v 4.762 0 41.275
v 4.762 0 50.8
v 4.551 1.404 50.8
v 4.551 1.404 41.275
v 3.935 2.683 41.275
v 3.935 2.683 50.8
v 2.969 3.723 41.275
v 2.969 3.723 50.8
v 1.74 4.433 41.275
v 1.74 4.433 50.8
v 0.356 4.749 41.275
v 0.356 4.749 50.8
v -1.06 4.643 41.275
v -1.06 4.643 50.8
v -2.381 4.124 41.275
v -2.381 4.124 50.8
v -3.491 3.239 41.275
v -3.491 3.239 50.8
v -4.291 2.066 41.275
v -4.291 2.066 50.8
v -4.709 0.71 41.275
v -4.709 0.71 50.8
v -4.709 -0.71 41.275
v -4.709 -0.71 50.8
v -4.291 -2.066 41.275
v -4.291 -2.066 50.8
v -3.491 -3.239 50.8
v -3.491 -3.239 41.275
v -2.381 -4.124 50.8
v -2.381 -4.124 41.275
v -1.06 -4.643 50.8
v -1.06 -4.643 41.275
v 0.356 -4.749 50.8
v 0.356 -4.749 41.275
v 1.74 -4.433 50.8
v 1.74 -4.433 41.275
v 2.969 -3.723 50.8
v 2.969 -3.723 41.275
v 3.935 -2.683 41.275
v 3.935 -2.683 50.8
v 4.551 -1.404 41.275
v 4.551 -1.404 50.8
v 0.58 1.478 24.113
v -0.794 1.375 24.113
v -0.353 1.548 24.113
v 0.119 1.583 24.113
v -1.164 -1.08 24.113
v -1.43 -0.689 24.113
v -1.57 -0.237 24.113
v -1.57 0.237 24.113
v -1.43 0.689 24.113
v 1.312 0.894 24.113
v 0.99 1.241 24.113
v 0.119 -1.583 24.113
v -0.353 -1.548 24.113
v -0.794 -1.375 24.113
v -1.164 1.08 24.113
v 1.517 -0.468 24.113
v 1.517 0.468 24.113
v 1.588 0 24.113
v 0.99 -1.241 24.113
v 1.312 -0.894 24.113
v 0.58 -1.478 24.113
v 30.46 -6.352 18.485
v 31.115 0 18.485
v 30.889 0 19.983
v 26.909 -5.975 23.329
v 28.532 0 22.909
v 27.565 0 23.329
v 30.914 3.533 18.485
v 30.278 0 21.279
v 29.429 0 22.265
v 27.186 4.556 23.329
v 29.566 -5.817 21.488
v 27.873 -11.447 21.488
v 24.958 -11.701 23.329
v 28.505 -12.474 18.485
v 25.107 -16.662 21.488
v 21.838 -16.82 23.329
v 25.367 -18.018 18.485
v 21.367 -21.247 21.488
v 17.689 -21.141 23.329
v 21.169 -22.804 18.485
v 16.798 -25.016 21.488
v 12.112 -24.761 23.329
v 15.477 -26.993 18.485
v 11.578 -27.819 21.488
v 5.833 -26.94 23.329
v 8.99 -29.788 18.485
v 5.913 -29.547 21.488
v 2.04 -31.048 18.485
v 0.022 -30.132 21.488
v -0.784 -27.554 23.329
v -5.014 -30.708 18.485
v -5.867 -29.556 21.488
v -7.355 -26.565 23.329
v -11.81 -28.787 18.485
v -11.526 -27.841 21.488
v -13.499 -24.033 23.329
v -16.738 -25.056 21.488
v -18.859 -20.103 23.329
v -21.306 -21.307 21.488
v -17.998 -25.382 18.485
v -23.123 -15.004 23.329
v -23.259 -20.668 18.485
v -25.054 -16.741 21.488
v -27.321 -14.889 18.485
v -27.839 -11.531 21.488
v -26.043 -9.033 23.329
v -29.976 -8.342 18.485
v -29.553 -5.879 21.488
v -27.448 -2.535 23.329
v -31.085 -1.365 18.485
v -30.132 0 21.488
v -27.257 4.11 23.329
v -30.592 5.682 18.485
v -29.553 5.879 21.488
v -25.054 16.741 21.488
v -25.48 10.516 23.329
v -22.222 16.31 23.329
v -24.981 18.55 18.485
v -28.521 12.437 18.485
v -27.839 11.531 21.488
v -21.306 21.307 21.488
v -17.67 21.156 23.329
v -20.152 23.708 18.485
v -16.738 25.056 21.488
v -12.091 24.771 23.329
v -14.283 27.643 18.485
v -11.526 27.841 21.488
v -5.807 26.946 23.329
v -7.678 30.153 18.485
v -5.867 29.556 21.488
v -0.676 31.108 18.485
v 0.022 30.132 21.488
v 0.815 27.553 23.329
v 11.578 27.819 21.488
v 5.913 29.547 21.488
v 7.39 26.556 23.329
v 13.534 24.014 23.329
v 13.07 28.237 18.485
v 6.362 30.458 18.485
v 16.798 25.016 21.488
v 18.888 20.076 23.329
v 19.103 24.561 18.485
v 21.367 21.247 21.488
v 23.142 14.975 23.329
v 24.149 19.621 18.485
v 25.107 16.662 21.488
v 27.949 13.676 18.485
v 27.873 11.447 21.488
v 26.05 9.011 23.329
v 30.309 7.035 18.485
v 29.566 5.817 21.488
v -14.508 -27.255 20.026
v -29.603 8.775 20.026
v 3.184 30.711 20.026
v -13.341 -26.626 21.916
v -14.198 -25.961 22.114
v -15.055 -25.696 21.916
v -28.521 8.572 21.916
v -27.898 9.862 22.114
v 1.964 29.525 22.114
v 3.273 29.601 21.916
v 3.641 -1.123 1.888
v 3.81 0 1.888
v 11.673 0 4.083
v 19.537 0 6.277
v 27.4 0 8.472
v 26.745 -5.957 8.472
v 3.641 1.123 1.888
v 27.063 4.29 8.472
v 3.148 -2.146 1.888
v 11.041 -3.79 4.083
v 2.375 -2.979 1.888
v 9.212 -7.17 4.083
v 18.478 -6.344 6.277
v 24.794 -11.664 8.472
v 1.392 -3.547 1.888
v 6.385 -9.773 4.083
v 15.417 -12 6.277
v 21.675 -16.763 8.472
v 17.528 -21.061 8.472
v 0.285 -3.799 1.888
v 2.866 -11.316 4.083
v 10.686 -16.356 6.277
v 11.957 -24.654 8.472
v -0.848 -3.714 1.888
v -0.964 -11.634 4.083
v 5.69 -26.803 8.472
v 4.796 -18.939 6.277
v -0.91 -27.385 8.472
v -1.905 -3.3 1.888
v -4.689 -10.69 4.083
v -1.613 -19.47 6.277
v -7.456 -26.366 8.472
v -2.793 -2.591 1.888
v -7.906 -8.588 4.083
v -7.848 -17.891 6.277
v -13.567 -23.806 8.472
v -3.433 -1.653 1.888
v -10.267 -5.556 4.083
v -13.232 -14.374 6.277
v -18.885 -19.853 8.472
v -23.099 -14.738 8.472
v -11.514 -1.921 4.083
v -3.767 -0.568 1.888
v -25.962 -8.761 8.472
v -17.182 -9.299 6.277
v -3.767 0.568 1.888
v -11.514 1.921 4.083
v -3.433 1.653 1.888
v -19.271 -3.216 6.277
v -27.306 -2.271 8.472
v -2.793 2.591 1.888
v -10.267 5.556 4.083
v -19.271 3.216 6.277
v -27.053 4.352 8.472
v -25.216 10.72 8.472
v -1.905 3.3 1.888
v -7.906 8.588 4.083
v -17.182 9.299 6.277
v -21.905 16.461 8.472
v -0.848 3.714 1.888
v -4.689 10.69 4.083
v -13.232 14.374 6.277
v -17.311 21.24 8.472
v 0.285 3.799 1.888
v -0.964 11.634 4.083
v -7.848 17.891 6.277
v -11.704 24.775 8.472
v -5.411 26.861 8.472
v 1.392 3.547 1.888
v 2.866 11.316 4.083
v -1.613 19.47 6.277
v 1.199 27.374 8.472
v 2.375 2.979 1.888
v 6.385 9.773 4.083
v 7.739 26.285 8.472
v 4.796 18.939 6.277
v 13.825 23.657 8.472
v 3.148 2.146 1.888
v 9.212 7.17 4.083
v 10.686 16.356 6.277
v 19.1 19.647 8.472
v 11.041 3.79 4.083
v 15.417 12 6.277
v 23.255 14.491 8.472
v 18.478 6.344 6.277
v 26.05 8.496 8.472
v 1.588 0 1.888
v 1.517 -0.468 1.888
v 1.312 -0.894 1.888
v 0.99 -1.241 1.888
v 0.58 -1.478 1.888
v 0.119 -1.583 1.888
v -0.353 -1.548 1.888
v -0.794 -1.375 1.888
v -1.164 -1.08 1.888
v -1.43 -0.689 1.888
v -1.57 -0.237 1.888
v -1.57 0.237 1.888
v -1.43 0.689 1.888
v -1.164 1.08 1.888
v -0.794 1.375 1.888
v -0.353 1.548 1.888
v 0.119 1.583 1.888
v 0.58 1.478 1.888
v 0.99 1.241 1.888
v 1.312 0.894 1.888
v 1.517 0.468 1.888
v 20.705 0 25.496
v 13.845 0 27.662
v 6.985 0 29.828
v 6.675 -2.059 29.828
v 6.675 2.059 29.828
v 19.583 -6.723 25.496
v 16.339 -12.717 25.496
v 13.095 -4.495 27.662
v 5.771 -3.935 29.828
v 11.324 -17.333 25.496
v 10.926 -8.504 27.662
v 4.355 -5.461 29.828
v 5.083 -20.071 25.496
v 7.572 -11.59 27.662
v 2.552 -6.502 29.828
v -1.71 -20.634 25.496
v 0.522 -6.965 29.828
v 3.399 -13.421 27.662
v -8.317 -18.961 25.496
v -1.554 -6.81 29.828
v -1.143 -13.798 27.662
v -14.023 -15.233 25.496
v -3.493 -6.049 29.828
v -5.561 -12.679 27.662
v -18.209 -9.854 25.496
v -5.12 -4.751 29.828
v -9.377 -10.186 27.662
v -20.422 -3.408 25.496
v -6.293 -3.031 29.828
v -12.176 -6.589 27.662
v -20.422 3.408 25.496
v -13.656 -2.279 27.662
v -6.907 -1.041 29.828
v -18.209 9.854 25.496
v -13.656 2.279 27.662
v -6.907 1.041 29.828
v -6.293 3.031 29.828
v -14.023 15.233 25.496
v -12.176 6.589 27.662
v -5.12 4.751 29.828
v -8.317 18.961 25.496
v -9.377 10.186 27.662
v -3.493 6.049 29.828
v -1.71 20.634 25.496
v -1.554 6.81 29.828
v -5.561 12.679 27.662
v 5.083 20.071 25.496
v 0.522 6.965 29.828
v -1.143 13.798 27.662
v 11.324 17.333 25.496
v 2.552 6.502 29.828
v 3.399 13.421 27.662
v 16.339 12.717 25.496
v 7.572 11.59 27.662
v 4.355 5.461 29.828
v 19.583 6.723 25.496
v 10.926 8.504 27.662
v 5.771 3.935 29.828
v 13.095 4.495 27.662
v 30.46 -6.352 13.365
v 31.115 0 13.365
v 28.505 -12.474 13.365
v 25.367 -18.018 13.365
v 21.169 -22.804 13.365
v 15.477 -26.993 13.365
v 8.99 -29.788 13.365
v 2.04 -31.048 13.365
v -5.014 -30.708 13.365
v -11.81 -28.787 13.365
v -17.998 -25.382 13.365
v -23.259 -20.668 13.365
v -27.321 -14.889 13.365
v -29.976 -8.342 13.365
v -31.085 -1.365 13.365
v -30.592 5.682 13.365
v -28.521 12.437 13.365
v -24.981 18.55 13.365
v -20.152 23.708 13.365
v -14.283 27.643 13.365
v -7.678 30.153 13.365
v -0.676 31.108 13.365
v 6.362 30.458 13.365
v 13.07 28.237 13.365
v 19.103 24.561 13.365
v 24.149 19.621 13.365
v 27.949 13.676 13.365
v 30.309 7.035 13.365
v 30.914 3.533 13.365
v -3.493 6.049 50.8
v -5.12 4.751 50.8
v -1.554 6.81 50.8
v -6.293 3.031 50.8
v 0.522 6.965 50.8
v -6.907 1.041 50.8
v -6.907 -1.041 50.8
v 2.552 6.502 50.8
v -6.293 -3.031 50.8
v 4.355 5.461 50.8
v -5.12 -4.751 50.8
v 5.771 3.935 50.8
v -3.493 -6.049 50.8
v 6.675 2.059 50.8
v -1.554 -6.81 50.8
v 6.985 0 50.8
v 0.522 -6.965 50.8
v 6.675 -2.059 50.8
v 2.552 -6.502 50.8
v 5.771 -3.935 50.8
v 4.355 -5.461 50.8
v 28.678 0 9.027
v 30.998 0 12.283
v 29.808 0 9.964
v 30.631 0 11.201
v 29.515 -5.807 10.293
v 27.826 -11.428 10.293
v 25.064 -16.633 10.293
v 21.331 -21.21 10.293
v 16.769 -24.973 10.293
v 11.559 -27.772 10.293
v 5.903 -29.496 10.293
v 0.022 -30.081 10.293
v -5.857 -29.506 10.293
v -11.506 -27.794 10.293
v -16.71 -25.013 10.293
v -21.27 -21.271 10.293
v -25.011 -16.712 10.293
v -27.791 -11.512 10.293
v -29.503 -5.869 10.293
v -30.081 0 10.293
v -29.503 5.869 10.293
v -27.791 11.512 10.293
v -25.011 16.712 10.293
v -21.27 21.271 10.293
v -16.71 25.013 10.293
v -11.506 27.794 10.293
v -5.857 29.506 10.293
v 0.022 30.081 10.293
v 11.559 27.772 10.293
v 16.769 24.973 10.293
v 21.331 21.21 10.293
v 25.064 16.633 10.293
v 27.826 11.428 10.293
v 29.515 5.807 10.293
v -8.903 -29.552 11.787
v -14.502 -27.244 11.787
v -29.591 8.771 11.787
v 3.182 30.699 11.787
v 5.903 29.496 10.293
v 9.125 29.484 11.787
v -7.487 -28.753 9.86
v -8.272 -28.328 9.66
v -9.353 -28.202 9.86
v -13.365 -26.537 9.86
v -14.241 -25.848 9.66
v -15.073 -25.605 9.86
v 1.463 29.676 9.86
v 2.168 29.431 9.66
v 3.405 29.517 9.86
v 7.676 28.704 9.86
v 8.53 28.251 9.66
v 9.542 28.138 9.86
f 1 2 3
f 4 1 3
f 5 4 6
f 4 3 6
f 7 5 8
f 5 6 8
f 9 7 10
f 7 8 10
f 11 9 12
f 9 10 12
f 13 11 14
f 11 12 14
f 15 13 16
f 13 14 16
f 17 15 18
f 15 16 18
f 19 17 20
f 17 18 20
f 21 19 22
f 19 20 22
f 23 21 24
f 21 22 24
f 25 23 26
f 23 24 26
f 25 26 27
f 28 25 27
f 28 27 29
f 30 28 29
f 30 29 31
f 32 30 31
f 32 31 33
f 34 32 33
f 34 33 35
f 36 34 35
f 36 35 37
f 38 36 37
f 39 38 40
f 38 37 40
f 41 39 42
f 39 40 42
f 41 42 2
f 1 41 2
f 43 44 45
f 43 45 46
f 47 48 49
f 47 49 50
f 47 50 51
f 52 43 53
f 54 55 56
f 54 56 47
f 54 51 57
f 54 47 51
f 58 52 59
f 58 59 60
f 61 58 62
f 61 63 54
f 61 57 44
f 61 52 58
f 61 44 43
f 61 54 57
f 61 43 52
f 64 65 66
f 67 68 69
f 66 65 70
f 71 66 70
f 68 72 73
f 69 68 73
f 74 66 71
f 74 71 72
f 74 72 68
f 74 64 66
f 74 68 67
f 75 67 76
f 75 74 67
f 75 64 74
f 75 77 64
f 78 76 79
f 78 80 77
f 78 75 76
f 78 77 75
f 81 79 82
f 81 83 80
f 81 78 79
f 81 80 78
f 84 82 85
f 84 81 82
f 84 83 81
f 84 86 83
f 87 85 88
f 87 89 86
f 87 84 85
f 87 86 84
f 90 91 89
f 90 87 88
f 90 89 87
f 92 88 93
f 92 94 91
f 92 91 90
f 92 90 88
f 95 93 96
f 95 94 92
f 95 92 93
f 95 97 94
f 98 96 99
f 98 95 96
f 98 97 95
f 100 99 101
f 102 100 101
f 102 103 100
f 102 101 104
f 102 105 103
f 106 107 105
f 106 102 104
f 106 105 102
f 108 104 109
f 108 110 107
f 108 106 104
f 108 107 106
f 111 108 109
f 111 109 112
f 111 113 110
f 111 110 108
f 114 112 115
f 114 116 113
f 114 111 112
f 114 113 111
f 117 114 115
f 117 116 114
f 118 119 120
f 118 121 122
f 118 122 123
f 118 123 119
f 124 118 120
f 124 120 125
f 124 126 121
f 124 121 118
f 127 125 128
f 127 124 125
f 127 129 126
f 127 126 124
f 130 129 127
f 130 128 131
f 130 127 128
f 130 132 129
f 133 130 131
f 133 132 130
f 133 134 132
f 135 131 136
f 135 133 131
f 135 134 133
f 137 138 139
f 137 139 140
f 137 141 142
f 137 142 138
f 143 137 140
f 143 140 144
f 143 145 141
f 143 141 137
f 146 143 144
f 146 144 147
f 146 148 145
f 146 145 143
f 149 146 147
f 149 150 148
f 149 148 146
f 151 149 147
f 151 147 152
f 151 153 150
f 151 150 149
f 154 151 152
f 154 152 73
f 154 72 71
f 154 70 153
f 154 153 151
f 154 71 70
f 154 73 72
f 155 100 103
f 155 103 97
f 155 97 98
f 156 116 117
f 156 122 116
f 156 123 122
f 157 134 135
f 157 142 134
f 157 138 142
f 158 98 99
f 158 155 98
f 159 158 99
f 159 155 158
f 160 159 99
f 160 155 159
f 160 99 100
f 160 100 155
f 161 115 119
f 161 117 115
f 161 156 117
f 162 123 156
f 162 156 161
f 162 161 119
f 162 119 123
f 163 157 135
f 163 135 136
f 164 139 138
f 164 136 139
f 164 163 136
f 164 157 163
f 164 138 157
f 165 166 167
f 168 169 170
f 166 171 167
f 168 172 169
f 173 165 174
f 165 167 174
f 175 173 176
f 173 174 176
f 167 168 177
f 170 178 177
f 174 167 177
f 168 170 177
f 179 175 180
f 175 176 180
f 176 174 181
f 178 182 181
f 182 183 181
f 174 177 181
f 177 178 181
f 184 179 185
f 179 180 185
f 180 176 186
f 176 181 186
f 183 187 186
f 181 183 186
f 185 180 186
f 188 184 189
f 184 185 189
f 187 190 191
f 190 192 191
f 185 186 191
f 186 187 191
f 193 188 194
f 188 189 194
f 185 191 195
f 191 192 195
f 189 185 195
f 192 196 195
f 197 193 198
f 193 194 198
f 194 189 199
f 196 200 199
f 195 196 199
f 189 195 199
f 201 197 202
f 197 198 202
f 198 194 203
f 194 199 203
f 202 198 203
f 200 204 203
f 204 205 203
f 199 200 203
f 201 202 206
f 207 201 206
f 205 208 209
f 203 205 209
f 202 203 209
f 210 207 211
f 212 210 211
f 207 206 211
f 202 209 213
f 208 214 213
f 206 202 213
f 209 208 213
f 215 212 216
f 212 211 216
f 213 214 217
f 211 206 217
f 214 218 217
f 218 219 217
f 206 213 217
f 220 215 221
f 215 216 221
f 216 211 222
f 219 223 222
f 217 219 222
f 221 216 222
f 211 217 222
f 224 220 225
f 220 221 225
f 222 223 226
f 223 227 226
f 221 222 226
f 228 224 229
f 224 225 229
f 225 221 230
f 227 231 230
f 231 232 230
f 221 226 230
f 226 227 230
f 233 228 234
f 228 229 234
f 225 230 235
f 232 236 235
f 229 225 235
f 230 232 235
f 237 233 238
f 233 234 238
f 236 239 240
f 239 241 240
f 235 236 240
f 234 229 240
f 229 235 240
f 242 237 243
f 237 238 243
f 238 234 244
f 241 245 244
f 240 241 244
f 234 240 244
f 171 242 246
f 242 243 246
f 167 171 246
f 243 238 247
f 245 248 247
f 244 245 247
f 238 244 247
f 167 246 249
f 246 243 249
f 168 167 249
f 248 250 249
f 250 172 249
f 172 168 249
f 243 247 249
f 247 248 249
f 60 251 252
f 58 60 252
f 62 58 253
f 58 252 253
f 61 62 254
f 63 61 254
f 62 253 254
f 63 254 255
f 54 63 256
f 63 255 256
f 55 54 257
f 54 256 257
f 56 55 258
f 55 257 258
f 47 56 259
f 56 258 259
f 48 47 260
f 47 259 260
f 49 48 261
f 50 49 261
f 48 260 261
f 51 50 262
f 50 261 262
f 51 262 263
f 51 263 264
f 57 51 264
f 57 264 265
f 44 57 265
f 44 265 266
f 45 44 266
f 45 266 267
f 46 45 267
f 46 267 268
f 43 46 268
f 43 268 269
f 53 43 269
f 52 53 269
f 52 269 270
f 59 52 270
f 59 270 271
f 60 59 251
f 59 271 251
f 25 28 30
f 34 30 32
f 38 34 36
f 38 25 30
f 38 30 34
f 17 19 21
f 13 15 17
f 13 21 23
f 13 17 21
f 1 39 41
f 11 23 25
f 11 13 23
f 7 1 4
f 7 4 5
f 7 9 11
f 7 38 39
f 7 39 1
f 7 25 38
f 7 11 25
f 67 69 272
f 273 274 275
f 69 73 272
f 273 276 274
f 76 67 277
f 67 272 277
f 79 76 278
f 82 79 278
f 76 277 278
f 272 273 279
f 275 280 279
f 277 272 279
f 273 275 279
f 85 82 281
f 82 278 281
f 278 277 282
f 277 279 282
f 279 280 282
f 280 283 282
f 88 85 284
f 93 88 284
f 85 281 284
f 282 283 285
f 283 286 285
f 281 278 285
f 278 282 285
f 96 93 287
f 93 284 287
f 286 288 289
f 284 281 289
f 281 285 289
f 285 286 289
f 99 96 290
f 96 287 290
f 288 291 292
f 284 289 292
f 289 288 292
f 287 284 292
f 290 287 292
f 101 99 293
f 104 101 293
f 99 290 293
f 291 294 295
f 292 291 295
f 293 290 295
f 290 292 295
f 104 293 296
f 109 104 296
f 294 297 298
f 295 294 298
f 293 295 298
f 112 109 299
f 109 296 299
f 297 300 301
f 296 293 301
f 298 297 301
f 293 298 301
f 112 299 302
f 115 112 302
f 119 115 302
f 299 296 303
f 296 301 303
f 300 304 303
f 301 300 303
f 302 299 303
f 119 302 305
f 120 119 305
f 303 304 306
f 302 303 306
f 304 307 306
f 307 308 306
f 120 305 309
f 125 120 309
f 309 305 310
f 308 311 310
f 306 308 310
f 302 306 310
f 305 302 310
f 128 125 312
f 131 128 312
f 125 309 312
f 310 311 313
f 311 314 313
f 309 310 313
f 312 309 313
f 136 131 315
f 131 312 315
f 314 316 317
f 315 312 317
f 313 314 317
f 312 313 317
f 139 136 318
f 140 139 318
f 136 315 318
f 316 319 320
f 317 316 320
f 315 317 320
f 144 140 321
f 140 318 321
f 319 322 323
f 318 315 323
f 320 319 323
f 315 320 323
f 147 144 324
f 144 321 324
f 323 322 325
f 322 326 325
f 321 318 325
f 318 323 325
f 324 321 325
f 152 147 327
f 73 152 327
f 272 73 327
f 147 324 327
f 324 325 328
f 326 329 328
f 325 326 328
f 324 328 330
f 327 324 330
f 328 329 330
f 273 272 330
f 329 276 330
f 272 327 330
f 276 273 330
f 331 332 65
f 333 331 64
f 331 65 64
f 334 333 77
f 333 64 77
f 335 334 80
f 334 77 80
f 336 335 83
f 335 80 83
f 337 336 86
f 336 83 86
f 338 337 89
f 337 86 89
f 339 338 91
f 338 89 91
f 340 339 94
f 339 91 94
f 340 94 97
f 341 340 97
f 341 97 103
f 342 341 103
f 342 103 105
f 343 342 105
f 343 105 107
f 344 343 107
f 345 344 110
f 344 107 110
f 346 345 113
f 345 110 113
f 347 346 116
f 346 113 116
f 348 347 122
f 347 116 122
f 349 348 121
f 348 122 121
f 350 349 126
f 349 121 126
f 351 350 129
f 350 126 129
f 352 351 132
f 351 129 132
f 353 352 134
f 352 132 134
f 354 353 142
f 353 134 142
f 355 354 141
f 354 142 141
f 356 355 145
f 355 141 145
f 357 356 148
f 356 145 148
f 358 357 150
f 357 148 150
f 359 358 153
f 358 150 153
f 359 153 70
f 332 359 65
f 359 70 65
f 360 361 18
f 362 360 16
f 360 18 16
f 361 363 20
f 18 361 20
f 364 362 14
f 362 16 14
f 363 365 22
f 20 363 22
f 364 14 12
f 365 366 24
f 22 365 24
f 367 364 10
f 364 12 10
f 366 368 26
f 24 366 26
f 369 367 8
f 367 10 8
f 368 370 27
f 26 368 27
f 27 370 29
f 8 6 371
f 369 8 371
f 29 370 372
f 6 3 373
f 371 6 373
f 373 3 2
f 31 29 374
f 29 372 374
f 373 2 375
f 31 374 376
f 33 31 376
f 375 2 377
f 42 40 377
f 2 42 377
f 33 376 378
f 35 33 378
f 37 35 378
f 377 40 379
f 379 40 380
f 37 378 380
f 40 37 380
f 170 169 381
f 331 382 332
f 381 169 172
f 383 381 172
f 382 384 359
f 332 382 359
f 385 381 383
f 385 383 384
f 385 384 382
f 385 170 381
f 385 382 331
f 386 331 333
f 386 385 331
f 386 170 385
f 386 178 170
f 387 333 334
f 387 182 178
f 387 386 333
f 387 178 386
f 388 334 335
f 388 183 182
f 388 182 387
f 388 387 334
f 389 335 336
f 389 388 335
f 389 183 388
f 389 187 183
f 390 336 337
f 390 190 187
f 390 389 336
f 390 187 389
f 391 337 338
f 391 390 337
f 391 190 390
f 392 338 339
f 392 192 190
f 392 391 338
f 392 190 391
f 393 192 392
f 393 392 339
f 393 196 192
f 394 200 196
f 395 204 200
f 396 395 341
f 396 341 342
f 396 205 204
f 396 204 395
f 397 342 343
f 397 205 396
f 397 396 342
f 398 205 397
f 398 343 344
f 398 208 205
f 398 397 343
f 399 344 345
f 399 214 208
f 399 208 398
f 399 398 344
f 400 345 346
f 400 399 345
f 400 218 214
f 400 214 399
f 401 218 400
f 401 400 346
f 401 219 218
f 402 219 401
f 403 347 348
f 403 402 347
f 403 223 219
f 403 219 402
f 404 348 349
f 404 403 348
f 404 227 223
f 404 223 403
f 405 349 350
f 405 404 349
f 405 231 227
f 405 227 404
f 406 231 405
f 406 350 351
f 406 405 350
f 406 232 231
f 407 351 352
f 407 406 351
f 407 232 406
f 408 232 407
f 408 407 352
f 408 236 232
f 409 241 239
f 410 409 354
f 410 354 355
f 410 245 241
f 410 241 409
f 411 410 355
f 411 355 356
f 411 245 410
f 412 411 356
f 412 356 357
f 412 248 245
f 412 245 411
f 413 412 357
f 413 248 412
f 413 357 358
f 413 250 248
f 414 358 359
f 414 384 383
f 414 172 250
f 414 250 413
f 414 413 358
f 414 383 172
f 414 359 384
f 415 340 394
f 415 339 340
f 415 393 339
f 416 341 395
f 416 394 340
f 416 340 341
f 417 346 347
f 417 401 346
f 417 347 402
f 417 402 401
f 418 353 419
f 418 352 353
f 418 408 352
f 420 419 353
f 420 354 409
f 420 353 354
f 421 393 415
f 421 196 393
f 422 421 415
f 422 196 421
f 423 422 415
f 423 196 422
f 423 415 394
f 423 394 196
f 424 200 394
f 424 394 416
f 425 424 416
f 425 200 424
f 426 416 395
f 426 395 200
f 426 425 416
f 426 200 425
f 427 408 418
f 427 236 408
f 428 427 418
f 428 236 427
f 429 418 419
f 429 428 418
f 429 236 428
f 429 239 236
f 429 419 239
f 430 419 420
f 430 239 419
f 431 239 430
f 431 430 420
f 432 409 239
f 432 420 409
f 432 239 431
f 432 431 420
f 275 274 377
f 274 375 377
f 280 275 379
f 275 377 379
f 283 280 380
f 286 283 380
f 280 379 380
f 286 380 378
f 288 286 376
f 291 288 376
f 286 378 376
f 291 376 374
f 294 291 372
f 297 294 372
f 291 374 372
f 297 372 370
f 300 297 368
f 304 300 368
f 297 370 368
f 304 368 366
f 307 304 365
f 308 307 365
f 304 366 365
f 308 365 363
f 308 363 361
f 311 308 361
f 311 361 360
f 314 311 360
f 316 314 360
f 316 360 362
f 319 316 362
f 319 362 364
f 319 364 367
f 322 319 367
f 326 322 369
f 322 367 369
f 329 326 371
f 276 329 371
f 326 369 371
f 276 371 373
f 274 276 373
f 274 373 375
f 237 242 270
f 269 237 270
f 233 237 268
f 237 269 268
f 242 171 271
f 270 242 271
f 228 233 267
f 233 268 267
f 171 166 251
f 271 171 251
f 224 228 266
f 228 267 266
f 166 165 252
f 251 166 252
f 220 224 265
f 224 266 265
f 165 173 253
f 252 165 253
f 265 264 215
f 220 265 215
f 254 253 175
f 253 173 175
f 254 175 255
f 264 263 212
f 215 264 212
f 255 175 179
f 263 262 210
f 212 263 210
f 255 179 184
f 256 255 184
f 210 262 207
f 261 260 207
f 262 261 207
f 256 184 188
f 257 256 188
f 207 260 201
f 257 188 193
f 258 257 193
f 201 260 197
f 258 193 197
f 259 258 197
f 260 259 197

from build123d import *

# Parameters (mm, degrees)
F2_R     = 4.7625
F3_DEPTH = 9.525
F4_R     = 1.5875
F5_DEPTH = 22.225
F6_R     = 5.08


with BuildPart() as f1:
    # F0 (on Front) → F1 (revolve)
    with BuildSketch(Plane.XZ):
        Polygon((3.81, 1.888357), (31.115, 9.508357), (31.115, 22.208357), (6.985, 29.828357), (6.985, 50.8), (0, 50.8), (0, 1.888357), align=None)
    revolve(axis=Axis((0, 0, 26.344178), (0, 0, -1)))

    # F2 (on face) → F3 (cut)
    with BuildSketch(Plane.XY.offset(50.8)):
        Circle(F2_R)
    extrude(amount=-F3_DEPTH, mode=Mode.SUBTRACT)

    # F4 (on face) → F5 (cut)
    with BuildSketch(Plane(origin=(0, 0, 1.888357), x_dir=(1, 0, 0), z_dir=(0, 0, -1))):
        Circle(F4_R)
    extrude(amount=-F5_DEPTH, mode=Mode.SUBTRACT)

    # F6
    f6_edges = [f1.edges().sort_by_distance(p)[0] for p in [
        (-31.115, 0, 9.508357),
        (-31.115, 0, 22.208357),
        (31.115, 0, 15.858357),
    ]]
    fillet(f6_edges, radius=F6_R)


solid = f1.part
